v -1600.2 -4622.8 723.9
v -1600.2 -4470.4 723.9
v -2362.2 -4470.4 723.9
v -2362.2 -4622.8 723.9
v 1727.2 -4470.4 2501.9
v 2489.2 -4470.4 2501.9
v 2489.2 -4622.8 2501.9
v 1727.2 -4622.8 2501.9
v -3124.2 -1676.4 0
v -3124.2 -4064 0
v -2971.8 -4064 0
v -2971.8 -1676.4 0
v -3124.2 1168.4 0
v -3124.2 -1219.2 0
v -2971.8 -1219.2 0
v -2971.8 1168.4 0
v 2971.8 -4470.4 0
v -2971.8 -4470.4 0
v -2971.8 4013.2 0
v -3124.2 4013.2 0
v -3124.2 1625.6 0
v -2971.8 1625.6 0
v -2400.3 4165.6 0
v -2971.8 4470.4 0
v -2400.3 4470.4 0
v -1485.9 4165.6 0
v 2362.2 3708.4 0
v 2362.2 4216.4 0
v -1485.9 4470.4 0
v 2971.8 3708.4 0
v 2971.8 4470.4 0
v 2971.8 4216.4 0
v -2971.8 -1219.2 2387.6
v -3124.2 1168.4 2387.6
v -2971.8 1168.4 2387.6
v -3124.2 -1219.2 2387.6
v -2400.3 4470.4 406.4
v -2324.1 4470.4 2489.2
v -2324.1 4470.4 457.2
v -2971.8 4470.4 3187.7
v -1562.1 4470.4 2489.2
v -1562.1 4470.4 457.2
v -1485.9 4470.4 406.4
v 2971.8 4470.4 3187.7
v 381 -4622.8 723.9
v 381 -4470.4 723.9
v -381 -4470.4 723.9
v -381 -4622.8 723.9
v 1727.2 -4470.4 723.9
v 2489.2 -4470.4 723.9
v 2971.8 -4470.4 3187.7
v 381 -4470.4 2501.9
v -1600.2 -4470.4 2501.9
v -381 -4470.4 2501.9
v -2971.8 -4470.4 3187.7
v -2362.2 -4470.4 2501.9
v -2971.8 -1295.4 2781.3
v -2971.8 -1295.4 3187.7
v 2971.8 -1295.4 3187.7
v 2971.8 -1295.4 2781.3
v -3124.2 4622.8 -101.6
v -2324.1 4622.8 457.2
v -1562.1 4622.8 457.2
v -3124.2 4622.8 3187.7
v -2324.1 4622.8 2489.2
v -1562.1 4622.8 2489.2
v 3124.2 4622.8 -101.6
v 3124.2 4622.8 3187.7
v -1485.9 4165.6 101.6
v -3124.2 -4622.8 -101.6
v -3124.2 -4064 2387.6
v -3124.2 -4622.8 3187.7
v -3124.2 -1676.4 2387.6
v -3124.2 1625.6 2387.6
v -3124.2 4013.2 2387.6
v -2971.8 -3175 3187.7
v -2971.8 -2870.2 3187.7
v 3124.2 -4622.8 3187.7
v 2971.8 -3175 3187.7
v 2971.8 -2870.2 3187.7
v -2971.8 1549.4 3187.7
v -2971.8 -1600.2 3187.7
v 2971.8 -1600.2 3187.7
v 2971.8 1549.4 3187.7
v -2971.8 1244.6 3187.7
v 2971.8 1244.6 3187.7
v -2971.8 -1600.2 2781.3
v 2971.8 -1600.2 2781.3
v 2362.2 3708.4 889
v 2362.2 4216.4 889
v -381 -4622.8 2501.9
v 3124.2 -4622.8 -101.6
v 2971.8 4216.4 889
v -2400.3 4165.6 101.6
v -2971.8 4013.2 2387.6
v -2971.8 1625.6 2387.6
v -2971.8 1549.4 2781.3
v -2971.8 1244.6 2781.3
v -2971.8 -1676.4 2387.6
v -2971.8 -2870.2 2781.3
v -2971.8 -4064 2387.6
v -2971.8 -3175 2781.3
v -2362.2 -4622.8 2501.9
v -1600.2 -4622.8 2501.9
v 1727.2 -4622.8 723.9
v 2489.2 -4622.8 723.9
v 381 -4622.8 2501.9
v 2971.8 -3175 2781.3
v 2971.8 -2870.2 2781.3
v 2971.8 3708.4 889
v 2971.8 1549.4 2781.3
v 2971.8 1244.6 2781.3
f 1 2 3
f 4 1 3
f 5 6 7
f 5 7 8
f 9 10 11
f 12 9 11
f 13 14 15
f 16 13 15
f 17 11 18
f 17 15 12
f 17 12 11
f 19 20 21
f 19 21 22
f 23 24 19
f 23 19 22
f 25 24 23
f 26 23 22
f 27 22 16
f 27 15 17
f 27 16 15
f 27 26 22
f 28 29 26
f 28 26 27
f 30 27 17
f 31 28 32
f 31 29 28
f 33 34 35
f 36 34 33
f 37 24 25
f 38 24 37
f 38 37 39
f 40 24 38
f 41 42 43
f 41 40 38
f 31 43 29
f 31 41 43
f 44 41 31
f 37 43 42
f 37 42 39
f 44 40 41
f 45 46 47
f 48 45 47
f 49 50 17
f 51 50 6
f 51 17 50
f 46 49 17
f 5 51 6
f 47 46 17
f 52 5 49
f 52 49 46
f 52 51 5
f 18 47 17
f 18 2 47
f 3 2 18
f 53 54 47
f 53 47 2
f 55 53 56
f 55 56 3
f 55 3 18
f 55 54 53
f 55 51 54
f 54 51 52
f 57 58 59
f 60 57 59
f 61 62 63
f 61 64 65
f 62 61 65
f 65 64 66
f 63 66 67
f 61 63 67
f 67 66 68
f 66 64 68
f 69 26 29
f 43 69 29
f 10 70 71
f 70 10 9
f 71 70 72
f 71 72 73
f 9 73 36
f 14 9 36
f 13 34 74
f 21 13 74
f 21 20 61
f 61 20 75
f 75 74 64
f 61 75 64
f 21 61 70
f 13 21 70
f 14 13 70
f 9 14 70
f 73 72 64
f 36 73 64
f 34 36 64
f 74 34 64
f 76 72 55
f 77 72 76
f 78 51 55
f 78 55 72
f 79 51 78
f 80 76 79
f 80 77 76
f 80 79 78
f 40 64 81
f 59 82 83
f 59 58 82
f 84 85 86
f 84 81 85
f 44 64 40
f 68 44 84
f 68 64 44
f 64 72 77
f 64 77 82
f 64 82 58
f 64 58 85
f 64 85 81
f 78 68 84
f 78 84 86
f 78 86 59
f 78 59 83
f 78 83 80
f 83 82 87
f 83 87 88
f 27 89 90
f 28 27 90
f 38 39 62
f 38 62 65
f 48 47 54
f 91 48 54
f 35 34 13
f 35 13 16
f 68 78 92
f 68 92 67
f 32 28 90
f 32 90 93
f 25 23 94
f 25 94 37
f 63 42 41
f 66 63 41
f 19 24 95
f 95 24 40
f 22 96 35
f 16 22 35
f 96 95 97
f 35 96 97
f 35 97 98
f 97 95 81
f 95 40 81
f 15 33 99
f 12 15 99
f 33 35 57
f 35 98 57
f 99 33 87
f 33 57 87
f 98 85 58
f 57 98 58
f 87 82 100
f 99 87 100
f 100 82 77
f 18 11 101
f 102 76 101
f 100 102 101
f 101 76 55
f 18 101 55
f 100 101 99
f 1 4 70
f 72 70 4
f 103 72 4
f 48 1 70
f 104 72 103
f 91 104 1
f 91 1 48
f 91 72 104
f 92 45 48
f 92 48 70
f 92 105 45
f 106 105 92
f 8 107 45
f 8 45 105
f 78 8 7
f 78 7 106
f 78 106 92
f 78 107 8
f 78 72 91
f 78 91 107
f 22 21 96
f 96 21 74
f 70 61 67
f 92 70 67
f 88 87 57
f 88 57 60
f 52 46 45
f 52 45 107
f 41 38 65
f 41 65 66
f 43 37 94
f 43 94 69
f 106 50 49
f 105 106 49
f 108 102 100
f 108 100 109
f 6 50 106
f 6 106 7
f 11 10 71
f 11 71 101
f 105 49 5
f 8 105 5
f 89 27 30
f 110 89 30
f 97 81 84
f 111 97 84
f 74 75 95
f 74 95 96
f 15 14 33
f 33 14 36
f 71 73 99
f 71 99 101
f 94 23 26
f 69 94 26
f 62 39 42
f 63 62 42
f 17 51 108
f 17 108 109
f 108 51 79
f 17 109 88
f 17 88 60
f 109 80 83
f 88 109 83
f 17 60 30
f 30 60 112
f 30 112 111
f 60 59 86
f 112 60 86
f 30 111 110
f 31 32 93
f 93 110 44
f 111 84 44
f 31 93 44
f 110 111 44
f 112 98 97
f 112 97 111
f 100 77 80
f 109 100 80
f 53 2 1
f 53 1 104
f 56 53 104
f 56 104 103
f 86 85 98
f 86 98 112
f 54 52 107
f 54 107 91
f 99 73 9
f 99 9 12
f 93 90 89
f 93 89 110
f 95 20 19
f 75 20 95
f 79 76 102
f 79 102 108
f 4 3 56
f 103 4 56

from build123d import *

# Parameters (mm, degrees)
F0_W          = 6248.4
F0_H          = 9245.6
F1_DEPTH      = 3340.1
F1_DEPTH_BACK = 101.6
F3_T          = -152.4
F2_W          = 9245.6
F2_H          = 3441.7
F2_W_2        = 2387.6
F2_H_2        = 2387.6
F4_DEPTH      = 152.4
F5_DEPTH      = 50.8
F6_W          = 914.4
F6_H          = 304.8
F7_DEPTH      = 406.4
F8_SIZE       = 304.79999
F9_W          = 5943.6
F9_H          = 304.8
F10_DEPTH     = 406.4
F11_W         = 762
F11_H         = 1778
F12_DEPTH     = 152.401
F13_W         = 609.6
F13_H         = 508
F14_DEPTH     = 889
F15_W         = 762
F15_H         = 2032
F16_DEPTH     = 152.401
F17_DEPTH     = 152.4


# Not quite as in the source:
# - a fillet or chamfer is up to 0.001 mm smaller than in the source, because OpenCascade refuses the exact size


with BuildPart() as f1:
    # F0 (on Top) → F1 (new body, two sides)
    with BuildSketch(Plane.XY) as f1_sk:
        Rectangle(F0_W, F0_H)
    extrude(amount=F1_DEPTH)
    extrude(f1_sk.sketch, amount=-F1_DEPTH_BACK)

    # F3
    f3_openings = [f1.faces().sort_by_distance(p)[0] for p in [
        (-3124.2, 0, 1619.25),
    ]]
    offset(amount=F3_T, openings=f3_openings)

    # F2 (on face) → F4 (join)
    with BuildSketch(Plane(origin=(-3124.2, 0, 0), x_dir=(0, -1, 0), z_dir=(-1, 0, 0))):
        with Locations((0, 1619.25)):
            Rectangle(F2_W, F2_H)
        with Locations((-2819.4, 1193.8)):
            Rectangle(F2_W_2, F2_H_2, mode=Mode.SUBTRACT)
        with Locations((25.4, 1193.8)):
            Rectangle(F2_W_2, F2_H_2, mode=Mode.SUBTRACT)
        with Locations((2870.2, 1193.8)):
            Rectangle(F2_W_2, F2_H_2, mode=Mode.SUBTRACT)
    extrude(amount=-F4_DEPTH)

    # F5 (cut): a face of the model
    f5_faces = [f1.faces().sort_by_distance(p)[0] for p in [
        (-61.3516059957, -0.5112633833, 50.8),
    ]]
    extrude(f5_faces, amount=-F5_DEPTH, mode=Mode.SUBTRACT)

    # F6 (on face) → F7 (join)
    with BuildSketch(Plane.XY):
        with Locations((-1943.1, 4318)):
            Rectangle(F6_W, F6_H)
    extrude(amount=F7_DEPTH)

    # F8 (size 304.8 in the source; OpenCascade refuses exactly that, so slightly less here)
    f8_edges = [f1.edges().sort_by_distance(p)[0] for p in [
        (-1943.1, 4165.6, 406.4),
    ]]
    chamfer(f8_edges, length=F8_SIZE)

    # F9 (on face) → F10 (join)
    with BuildSketch(Plane(origin=(0, 0, 3187.7), x_dir=(1, 0, 0), z_dir=(0, 0, -1))):
        with Locations((0, 1447.8)):
            Rectangle(F9_W, F9_H)
        with Locations((0, -1397)):
            Rectangle(F9_W, F9_H)
        with Locations((0, 3022.6)):
            Rectangle(F9_W, F9_H)
    extrude(amount=F10_DEPTH)

    # F11 (on face) → F12 (cut, through all)
    with BuildSketch(Plane(origin=(0, -4470.4, 0), x_dir=(-1, 0, 0), z_dir=(0, 1, 0))):
        with Locations((1981.2, 1612.9)):
            Rectangle(F11_W, F11_H)
        with Locations((0, 1612.9)):
            Rectangle(F11_W, F11_H)
        with Locations((-2108.2, 1612.9)):
            Rectangle(F11_W, F11_H)
    extrude(amount=-F12_DEPTH, mode=Mode.SUBTRACT)

    # F13 (on face) → F14 (join)
    with BuildSketch(Plane.XY):
        with Locations((2667, 3962.4)):
            Rectangle(F13_W, F13_H)
    extrude(amount=F14_DEPTH)

    # F15 (on face) → F16 (cut, through all)
    with BuildSketch(Plane.XZ.offset(-4470.4)):
        with Locations((-1943.1, 1473.2)):
            Rectangle(F15_W, F15_H)
    extrude(amount=-F16_DEPTH, mode=Mode.SUBTRACT)

    # F17 (cut): a face of the model
    f17_faces = [f1.faces().sort_by_distance(p)[0] for p in [
        (0, 0, 3340.1),
    ]]
    extrude(f17_faces, amount=-F17_DEPTH, mode=Mode.SUBTRACT)


solid = f1.part
